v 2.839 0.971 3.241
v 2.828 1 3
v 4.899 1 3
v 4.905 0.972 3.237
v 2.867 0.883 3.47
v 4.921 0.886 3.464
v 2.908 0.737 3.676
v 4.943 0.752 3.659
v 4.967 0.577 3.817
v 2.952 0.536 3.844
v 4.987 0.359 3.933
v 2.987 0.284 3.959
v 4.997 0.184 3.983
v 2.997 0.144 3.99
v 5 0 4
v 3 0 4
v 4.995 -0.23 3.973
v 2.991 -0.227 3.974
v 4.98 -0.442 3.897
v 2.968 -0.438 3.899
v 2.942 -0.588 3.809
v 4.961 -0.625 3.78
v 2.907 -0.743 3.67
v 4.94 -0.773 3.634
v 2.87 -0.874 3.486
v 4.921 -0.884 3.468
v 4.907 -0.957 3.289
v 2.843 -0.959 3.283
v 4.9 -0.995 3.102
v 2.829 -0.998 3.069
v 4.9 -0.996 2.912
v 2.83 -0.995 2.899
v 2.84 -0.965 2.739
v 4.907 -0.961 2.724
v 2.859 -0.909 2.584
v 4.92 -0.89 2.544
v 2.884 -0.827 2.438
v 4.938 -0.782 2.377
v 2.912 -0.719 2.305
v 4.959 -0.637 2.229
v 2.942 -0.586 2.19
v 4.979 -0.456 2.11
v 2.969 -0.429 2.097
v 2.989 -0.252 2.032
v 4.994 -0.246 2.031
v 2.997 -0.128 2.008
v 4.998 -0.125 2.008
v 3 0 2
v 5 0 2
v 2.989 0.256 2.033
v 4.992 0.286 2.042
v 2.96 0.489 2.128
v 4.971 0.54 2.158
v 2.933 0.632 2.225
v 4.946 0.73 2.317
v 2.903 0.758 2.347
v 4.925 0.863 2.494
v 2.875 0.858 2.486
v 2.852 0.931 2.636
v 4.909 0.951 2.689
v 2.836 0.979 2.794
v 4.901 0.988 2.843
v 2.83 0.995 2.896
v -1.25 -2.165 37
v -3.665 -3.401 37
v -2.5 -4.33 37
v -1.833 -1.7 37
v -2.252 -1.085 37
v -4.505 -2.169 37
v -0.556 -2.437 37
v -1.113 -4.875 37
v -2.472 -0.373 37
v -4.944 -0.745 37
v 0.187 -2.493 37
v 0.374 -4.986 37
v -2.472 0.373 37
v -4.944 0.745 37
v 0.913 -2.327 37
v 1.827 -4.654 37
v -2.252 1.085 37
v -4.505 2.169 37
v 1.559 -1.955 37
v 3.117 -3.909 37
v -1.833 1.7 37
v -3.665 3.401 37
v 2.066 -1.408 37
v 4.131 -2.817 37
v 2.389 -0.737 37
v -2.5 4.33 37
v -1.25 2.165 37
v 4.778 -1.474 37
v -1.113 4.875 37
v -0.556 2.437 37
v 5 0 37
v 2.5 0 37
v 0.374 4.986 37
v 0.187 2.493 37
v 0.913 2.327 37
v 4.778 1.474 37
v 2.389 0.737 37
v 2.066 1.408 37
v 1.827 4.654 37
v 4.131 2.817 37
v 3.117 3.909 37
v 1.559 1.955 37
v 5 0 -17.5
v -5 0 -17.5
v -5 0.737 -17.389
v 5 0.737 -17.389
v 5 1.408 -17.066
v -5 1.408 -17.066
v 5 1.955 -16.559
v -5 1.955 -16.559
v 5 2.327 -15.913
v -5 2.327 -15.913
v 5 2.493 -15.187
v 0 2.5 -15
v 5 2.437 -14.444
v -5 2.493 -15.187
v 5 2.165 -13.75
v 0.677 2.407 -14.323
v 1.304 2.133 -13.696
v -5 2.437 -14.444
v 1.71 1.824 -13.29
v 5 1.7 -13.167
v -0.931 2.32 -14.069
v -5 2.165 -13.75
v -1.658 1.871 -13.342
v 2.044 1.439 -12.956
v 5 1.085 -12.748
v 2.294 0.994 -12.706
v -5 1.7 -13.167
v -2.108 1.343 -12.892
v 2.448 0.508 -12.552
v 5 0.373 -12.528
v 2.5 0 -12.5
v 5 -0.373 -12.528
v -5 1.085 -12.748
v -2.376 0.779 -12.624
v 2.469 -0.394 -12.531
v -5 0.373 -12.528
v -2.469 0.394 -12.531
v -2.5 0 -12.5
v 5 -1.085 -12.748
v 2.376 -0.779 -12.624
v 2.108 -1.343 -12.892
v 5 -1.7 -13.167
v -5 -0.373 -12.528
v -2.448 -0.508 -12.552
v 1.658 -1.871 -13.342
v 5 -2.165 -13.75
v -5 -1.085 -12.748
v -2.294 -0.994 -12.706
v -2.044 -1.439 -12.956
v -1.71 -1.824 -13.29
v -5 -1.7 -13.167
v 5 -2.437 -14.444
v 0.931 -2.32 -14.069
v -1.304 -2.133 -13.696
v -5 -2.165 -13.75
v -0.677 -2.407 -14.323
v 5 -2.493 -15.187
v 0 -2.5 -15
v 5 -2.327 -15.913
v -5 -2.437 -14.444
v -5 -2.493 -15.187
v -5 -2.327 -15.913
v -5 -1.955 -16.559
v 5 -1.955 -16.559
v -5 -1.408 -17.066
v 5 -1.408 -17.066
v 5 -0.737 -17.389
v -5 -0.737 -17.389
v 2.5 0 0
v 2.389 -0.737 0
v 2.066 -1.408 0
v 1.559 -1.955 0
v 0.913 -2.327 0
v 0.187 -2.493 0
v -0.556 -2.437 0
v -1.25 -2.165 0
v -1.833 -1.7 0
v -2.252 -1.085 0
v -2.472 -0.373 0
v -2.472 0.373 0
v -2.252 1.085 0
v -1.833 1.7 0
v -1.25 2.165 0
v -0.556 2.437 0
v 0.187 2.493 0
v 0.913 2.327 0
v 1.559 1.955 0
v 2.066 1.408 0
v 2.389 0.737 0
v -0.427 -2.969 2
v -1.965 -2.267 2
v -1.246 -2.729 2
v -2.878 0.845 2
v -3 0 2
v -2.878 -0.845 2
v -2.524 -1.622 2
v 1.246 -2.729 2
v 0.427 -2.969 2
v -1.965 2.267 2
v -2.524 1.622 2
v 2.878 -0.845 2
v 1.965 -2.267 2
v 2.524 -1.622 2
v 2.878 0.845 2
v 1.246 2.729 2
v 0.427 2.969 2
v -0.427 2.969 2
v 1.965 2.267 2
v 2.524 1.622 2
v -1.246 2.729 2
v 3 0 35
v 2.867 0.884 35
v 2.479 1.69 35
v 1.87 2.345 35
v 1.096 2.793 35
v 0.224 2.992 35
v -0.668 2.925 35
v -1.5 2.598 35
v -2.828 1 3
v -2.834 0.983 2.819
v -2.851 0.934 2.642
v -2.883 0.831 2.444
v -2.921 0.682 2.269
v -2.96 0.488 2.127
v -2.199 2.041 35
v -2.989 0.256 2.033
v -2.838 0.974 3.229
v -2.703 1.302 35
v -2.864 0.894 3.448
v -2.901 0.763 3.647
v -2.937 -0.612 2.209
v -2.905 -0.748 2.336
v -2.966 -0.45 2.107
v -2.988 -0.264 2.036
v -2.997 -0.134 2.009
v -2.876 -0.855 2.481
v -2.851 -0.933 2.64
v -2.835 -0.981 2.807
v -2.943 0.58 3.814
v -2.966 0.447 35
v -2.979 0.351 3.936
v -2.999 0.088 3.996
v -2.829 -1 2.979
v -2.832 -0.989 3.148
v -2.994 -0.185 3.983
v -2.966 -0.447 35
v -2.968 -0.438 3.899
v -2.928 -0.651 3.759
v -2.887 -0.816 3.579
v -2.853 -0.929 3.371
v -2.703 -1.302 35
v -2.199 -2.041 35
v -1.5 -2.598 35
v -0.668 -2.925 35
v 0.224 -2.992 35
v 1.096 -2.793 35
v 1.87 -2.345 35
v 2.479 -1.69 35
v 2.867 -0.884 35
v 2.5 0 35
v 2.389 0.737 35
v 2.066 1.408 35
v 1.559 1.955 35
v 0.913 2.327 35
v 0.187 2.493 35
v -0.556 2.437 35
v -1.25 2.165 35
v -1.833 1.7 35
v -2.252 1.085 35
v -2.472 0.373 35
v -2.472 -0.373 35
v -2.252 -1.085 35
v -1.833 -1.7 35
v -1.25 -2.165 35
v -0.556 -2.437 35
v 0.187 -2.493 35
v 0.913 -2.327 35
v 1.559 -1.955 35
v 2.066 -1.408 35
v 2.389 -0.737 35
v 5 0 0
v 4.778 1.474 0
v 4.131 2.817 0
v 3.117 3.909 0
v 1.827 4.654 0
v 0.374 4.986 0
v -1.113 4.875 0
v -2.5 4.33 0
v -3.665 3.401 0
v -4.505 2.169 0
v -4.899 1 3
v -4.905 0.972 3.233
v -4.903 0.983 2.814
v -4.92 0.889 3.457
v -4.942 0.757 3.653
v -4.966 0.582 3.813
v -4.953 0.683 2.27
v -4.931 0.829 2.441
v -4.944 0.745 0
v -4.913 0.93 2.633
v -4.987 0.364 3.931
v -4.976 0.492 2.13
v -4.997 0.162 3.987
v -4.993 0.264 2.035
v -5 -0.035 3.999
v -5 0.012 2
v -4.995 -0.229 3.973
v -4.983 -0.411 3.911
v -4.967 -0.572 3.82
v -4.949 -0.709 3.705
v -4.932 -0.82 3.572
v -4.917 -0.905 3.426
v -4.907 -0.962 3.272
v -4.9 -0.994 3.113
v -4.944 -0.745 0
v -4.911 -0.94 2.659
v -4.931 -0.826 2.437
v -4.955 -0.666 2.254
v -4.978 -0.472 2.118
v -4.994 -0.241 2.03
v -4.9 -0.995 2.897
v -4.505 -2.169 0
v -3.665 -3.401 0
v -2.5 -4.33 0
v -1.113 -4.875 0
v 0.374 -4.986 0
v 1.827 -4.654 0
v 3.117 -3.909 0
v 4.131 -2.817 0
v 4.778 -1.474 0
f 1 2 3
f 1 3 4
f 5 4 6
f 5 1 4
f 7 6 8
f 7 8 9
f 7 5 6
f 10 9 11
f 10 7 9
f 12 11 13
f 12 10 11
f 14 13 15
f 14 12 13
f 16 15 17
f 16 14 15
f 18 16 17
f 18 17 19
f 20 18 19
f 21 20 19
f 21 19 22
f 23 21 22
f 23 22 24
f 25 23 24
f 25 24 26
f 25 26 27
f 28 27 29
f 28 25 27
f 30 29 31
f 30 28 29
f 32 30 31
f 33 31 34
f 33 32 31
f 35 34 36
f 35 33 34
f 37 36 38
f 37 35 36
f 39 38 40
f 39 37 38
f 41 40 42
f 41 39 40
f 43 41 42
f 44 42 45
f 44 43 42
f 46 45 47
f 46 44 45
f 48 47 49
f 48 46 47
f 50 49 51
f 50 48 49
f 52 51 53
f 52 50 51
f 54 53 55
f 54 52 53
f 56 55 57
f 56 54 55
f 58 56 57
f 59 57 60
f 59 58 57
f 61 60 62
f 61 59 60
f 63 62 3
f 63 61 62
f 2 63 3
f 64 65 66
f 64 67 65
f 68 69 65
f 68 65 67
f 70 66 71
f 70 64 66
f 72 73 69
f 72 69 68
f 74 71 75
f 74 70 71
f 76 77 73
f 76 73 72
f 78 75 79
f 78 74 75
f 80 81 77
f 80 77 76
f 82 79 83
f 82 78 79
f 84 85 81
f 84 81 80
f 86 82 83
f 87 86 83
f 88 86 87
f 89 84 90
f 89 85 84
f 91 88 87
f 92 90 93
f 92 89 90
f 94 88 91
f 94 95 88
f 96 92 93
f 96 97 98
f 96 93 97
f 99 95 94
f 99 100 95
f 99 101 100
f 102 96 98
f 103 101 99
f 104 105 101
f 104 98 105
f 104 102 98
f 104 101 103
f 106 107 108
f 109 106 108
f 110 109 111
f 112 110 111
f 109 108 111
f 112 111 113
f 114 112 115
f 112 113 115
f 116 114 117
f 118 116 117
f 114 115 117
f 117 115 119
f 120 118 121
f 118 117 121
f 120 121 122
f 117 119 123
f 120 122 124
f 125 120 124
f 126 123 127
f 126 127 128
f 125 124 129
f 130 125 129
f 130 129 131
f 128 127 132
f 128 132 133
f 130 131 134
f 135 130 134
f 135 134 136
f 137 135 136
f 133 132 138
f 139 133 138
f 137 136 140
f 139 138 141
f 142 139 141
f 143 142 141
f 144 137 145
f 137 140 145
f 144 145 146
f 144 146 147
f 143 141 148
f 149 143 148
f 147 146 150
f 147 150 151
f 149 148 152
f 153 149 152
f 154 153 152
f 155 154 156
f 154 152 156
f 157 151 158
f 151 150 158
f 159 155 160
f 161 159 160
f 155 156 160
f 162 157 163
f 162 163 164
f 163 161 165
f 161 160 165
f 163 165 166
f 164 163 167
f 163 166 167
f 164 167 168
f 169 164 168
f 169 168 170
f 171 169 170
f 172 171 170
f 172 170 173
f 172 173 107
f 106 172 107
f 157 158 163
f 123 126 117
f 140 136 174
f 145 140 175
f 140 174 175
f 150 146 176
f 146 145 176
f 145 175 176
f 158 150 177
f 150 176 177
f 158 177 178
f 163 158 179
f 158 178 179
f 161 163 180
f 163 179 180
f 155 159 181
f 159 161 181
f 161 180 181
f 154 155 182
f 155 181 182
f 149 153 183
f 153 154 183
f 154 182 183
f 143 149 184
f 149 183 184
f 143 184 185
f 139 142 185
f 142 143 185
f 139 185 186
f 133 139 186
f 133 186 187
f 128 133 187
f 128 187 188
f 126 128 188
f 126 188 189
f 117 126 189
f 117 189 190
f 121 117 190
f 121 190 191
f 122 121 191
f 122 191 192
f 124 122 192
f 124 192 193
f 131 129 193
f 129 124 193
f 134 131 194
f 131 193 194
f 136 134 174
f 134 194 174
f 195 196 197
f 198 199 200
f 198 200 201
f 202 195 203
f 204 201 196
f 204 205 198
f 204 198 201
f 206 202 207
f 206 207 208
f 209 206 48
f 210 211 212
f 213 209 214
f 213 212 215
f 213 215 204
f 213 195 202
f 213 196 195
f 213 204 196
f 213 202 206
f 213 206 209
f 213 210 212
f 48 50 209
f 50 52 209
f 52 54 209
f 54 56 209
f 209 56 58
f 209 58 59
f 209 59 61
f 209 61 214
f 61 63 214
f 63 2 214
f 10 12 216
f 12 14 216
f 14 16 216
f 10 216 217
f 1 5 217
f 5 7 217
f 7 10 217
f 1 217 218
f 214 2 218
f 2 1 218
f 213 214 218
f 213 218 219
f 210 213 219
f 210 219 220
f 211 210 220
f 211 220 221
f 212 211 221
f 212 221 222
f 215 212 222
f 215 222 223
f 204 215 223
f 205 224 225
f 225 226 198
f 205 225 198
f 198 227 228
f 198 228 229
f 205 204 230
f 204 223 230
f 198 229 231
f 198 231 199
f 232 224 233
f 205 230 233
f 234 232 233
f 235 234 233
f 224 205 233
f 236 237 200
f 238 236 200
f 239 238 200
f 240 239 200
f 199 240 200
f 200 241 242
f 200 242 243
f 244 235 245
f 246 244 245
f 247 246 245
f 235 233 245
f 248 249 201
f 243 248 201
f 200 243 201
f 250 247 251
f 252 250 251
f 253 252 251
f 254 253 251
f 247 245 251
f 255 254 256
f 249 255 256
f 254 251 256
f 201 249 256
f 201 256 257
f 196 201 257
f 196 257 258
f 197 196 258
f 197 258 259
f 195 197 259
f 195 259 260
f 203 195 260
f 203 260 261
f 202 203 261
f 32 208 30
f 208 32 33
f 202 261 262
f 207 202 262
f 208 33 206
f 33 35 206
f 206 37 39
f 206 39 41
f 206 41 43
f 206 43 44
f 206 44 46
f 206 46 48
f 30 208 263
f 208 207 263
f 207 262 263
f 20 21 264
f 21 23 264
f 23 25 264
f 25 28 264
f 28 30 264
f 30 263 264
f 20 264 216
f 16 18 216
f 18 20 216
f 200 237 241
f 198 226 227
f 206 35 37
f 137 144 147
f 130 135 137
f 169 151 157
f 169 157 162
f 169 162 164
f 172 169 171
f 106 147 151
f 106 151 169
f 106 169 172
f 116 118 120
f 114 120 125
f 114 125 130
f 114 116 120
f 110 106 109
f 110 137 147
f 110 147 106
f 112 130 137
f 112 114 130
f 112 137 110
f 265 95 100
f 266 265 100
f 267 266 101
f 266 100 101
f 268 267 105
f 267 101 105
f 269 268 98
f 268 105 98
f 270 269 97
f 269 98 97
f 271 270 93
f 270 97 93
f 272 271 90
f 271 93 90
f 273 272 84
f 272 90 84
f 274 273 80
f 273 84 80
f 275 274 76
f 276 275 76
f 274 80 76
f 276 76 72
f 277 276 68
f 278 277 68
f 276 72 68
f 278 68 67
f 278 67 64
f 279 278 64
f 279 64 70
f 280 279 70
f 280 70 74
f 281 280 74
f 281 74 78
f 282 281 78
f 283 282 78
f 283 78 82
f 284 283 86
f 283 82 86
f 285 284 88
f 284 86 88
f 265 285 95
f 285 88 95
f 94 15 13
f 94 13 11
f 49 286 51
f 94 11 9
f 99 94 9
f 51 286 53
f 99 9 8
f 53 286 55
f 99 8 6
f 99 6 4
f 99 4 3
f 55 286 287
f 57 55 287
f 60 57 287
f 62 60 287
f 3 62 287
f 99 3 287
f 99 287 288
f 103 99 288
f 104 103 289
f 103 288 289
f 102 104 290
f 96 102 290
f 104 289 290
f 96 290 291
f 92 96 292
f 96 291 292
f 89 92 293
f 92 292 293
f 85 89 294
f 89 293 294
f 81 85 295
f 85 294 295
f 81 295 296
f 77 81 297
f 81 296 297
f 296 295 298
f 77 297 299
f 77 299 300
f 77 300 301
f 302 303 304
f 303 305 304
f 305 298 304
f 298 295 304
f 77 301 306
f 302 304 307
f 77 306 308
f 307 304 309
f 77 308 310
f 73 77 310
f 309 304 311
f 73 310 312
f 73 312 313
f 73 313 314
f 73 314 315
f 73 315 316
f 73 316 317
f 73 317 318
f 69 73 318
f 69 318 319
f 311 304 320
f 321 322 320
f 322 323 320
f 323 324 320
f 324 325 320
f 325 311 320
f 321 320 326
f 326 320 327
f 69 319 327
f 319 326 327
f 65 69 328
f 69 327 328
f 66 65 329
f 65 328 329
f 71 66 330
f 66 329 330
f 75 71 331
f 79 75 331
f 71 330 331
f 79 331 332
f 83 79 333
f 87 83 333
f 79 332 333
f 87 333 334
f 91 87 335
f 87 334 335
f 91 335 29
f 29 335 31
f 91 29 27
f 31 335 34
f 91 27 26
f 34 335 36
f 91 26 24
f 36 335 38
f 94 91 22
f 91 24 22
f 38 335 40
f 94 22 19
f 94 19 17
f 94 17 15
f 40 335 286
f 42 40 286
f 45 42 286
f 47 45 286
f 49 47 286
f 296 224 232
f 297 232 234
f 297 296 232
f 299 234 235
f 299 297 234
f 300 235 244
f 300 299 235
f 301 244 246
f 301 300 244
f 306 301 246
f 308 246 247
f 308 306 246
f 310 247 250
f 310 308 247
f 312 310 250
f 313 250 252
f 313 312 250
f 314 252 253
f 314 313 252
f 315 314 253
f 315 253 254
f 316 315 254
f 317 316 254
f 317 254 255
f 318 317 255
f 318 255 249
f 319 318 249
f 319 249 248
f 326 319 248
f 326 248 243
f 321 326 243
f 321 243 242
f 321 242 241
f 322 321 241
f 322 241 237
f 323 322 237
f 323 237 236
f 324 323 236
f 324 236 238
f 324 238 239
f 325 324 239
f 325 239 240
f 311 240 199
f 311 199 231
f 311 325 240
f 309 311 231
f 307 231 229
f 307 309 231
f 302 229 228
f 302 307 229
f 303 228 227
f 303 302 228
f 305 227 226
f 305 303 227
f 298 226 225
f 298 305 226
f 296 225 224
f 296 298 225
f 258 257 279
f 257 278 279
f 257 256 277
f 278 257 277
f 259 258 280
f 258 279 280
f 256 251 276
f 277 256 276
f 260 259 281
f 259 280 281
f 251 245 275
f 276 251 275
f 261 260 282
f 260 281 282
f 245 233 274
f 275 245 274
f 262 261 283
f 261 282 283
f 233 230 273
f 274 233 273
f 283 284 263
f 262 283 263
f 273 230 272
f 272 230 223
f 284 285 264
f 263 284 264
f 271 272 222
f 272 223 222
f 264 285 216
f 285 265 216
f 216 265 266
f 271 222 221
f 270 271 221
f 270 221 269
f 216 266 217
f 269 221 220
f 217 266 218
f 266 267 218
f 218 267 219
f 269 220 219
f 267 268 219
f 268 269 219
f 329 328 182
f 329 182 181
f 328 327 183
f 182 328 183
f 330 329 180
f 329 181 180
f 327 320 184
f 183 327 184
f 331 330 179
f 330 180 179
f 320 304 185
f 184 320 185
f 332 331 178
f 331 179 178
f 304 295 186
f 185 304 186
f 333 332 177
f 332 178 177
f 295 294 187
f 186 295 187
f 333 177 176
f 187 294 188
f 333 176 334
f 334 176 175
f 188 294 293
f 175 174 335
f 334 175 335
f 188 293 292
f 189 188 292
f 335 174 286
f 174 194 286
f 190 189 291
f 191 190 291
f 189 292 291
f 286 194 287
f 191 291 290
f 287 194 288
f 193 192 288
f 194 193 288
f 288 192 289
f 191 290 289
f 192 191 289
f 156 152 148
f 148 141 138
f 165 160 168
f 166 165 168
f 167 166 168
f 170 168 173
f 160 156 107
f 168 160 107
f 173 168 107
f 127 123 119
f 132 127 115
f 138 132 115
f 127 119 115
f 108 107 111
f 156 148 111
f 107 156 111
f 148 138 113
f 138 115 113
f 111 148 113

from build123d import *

# Parameters (mm, degrees)
SKETCH1_R                = 5
BOSS_EXTRUDE1_DEPTH      = 37
SKETCH2_R                = 2.5
CUT_EXTRUDE1_DEPTH       = 2
SKETCH3_R                = 3
CUT_EXTRUDE2_DEPTH       = 33
CUT_EXTRUDE3_START       = -5.000000101
CUT_EXTRUDE3_OUTLINE_R   = 1
CUT_EXTRUDE3_DEPTH       = 10.000000201
SKETCH4_R                = 2.5
BOSS_EXTRUDE2_DEPTH      = 15
BOSS_EXTRUDE3_DEPTH      = 5
BOSS_EXTRUDE3_DEPTH_BACK = 5
SKETCH5_R                = 2.5


# Read off the part's stored shape, not the designer's step: Cut-Extrude3
with BuildPart() as part:
    # Sketch1 → Boss-Extrude1 (new body)
    with BuildSketch(Plane.XY):
        Circle(SKETCH1_R)
    extrude(amount=BOSS_EXTRUDE1_DEPTH)

    # Sketch2 → Cut-Extrude1 (cut)
    with BuildSketch(Plane.XY.offset(37)):
        Circle(SKETCH2_R)
    extrude(amount=-CUT_EXTRUDE1_DEPTH, mode=Mode.SUBTRACT)

    # Sketch3 → Cut-Extrude2 (cut)
    with BuildSketch(Plane.XY.offset(35)):
        Circle(SKETCH3_R)
    extrude(amount=-CUT_EXTRUDE2_DEPTH, mode=Mode.SUBTRACT)

    # Cut-Extrude3 outline → Cut-Extrude3 (cut)
    with BuildSketch(Plane.YZ.offset(CUT_EXTRUDE3_START)):
        with Locations((0, 3)):
            Circle(CUT_EXTRUDE3_OUTLINE_R)
    extrude(amount=CUT_EXTRUDE3_DEPTH, mode=Mode.SUBTRACT)

    # Sketch4 → Boss-Extrude2 (add)
    with BuildSketch(Plane(origin=(0, 0, 0), x_dir=(-1, 0, 0), z_dir=(0, 0, -1))):
        with Locations(Location((0, 0, 0), (0, 0, 180))):
            Circle(SKETCH4_R)
    extrude(amount=BOSS_EXTRUDE2_DEPTH)

    # Sketch5 → Boss-Extrude3 (add, two sides: drawn at the far end of the back side and taken through both)
    with BuildSketch(Plane(origin=(0, 0, 0), x_dir=(0, 0, -1), z_dir=(1, 0, 0)).offset(-BOSS_EXTRUDE3_DEPTH_BACK)):
        with Locations((15, 0)):
            Circle(SKETCH5_R)
    extrude(amount=BOSS_EXTRUDE3_DEPTH + BOSS_EXTRUDE3_DEPTH_BACK)


solid = part.part
